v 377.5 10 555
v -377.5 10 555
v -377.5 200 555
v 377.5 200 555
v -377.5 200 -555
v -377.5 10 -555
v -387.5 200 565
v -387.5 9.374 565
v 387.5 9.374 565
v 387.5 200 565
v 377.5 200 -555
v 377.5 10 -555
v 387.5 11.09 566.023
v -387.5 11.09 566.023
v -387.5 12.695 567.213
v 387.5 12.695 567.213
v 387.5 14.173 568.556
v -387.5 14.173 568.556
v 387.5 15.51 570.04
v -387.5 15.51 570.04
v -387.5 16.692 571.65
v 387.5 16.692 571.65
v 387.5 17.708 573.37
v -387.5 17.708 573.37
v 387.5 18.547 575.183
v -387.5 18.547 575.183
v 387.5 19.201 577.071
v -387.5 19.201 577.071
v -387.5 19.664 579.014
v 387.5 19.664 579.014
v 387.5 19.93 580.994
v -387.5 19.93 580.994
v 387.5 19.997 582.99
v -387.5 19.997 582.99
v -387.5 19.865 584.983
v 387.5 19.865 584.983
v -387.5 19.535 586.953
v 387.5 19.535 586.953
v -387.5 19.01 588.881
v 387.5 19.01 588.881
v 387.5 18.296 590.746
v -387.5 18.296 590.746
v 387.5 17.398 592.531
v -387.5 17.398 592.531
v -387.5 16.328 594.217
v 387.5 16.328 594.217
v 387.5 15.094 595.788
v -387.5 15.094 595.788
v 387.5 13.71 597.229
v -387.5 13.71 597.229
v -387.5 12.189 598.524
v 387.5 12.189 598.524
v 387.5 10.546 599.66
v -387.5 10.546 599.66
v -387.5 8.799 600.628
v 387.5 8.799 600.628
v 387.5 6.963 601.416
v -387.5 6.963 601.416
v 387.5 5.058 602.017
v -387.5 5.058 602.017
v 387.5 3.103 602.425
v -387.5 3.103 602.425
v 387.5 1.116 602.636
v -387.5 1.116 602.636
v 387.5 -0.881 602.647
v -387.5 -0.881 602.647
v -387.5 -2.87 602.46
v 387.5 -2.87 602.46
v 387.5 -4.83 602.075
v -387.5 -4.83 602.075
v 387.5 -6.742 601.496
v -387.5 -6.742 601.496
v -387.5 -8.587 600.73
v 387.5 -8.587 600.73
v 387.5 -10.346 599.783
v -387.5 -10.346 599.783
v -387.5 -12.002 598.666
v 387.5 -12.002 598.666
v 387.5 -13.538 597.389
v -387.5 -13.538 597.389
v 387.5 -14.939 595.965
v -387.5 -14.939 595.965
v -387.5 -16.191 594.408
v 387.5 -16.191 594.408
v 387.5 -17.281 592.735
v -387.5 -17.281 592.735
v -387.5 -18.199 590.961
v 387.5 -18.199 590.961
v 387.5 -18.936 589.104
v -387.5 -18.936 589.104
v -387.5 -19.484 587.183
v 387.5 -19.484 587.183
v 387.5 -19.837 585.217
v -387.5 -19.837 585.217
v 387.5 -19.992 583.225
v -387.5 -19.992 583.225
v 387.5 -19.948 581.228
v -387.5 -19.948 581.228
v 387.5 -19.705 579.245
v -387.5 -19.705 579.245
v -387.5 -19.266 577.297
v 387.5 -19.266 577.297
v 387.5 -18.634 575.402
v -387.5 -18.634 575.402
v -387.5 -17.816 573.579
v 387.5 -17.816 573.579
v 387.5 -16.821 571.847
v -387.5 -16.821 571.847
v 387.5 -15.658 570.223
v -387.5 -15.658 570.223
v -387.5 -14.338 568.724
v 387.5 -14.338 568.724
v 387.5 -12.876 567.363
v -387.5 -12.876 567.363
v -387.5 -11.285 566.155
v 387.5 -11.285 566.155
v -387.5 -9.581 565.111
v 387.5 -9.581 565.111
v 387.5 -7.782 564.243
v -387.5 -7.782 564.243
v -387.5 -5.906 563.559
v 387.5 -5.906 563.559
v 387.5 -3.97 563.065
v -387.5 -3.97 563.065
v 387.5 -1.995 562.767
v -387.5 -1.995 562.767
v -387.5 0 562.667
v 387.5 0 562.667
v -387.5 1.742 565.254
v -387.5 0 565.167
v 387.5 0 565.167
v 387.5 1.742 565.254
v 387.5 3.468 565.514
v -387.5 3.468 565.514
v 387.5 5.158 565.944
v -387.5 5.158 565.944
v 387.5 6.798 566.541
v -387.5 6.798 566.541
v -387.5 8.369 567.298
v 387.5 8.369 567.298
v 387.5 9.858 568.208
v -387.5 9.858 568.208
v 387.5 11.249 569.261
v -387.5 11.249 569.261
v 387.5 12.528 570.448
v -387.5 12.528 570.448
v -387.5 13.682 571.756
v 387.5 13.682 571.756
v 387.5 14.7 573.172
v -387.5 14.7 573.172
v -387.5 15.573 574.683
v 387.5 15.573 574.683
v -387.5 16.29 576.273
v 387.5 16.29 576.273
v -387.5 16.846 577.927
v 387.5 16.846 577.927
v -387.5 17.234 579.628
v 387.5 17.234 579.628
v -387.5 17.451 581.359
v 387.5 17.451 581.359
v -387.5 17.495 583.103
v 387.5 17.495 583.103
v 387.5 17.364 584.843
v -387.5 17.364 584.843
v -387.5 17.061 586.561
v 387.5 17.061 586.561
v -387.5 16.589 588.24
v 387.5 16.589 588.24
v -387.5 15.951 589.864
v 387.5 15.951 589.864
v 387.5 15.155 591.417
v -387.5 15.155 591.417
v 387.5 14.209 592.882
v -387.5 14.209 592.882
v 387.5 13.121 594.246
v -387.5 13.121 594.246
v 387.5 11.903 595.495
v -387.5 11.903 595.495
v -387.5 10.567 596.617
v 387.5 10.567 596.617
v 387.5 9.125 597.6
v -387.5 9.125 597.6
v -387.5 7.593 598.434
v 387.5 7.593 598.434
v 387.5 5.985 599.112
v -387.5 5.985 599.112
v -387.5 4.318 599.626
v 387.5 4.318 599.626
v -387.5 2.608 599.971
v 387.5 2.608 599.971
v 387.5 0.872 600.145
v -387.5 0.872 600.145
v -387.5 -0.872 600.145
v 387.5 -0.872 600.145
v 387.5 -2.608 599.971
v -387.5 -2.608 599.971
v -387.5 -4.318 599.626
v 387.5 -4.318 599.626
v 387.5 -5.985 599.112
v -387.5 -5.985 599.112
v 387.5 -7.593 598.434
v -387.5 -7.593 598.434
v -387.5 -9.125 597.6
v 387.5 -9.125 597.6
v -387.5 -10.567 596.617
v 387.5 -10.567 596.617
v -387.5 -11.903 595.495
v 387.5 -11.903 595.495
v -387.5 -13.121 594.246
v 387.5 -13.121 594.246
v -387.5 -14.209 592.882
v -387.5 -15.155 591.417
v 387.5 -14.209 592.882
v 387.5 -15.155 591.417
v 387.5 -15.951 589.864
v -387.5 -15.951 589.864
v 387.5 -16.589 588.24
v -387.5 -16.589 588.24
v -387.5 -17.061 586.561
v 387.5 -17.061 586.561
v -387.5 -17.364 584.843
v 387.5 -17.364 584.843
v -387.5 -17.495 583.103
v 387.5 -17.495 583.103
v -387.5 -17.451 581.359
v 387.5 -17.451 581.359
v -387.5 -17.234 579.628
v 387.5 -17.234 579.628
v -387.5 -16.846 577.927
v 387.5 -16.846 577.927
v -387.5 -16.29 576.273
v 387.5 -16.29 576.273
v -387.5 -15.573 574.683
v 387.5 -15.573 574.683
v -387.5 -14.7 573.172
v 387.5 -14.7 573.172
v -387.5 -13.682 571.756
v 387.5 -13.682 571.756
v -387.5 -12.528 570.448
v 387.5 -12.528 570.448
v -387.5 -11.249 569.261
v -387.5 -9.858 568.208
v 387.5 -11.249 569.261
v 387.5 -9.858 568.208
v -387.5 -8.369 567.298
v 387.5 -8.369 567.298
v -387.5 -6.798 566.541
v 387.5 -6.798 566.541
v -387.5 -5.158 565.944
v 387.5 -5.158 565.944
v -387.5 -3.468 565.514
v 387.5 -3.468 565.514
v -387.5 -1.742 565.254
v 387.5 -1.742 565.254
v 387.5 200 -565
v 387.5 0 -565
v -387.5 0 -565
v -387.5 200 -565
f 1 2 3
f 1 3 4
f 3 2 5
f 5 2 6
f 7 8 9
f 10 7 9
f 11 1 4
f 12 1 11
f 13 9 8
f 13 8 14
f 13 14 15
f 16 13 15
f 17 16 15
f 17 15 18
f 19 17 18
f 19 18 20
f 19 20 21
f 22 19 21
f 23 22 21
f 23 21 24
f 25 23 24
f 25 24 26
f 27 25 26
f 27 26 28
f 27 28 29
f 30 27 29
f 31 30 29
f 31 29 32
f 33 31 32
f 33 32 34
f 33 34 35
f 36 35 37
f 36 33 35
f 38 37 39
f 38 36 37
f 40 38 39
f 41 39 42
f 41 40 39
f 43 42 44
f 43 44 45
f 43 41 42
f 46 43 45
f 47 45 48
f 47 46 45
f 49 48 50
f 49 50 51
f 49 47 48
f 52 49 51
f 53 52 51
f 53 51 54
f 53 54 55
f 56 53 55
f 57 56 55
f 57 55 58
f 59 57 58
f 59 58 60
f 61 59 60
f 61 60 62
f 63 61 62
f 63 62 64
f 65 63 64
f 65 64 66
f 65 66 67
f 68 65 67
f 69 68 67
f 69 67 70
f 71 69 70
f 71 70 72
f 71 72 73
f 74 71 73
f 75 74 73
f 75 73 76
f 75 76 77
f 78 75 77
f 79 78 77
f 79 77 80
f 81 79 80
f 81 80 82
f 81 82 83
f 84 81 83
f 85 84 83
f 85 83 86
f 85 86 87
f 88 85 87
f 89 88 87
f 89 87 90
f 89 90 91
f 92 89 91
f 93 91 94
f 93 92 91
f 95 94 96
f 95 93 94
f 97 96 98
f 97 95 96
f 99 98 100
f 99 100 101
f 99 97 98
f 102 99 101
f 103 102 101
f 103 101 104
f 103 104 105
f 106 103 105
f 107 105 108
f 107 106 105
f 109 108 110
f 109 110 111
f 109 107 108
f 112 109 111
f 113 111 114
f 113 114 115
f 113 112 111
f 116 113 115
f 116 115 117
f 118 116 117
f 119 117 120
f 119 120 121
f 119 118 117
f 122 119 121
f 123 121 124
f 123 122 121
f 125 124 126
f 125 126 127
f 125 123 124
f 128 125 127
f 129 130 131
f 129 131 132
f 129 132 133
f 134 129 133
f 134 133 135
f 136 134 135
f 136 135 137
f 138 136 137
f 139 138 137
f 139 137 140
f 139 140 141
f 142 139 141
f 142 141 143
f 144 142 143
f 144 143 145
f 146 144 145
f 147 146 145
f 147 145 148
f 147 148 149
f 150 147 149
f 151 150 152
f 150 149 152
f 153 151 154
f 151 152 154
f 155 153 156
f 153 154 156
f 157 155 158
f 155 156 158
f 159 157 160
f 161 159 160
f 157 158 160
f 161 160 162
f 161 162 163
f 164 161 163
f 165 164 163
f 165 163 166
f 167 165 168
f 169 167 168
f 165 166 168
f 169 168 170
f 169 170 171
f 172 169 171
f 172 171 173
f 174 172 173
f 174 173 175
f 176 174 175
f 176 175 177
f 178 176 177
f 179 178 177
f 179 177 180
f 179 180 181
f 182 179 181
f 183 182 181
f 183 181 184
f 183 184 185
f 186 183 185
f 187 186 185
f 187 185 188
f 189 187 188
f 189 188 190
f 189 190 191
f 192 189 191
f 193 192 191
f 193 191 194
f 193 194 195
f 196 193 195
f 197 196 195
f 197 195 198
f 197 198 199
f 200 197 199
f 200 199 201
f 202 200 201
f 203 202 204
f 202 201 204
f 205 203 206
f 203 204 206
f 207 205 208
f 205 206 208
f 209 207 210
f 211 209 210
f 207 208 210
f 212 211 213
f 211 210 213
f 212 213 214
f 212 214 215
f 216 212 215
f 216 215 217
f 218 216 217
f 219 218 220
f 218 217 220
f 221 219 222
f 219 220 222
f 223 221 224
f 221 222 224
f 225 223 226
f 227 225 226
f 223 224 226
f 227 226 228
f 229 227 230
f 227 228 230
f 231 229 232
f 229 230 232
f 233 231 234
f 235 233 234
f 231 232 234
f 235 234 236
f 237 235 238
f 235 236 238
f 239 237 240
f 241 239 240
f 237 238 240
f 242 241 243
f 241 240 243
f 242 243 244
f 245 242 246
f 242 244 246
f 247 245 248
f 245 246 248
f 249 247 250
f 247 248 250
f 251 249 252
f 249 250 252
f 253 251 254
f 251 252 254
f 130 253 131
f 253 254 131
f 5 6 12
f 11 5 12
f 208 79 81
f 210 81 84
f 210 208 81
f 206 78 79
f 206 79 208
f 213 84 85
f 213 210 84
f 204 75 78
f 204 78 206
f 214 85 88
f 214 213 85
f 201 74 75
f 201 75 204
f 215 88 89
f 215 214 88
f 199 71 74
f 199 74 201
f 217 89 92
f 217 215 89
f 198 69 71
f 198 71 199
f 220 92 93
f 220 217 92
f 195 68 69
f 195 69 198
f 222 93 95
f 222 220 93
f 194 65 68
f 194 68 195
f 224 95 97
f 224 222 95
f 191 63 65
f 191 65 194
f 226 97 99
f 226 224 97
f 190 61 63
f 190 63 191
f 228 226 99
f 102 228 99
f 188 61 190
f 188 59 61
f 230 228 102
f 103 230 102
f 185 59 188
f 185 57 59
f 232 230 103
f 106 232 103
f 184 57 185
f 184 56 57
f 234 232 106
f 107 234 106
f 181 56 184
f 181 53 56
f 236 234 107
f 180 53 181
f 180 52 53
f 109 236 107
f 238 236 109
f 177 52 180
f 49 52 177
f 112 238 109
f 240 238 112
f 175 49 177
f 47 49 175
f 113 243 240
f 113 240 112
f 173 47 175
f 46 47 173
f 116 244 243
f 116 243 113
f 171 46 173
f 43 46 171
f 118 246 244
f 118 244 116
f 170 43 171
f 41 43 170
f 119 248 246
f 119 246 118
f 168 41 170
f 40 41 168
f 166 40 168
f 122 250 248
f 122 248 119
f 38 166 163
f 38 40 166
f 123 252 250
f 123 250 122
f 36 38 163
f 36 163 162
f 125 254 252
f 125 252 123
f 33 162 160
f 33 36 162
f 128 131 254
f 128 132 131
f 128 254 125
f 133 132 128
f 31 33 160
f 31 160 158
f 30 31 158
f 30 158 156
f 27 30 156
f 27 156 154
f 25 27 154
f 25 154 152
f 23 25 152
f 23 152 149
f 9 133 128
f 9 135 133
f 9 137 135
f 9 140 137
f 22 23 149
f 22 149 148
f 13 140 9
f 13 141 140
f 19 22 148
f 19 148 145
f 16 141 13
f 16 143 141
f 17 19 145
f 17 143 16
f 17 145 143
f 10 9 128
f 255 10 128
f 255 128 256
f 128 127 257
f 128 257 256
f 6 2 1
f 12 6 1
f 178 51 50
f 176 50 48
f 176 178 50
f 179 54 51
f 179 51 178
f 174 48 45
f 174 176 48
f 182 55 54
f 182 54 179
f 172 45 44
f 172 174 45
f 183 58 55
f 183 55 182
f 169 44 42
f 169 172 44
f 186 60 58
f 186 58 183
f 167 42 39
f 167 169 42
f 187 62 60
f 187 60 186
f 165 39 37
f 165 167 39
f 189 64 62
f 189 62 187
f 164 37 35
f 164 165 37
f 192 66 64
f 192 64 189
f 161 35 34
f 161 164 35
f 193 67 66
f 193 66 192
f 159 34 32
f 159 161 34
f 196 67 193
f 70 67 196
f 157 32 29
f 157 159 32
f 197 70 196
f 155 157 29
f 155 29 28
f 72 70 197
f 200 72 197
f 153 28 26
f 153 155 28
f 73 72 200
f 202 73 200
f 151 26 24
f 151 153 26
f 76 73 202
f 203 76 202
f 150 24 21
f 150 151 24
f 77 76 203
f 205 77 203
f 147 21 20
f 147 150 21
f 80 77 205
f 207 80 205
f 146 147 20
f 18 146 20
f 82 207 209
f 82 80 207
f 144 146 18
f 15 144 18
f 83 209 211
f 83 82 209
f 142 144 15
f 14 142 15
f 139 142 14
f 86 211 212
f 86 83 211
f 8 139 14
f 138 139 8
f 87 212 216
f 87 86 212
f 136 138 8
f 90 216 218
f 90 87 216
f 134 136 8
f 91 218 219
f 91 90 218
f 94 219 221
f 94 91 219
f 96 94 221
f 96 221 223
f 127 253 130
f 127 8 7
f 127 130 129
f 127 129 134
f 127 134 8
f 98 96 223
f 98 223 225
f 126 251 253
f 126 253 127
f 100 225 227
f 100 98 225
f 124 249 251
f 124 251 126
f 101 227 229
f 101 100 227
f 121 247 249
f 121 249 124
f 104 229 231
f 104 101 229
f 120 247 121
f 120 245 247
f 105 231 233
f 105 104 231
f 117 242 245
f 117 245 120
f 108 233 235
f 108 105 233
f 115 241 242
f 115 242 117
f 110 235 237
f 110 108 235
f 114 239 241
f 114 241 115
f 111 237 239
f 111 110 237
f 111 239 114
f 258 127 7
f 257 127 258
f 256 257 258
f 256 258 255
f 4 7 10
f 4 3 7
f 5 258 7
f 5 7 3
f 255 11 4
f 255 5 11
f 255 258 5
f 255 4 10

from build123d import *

# Parameters (mm, degrees)
SKETCH1_W           = 775
SKETCH1_H           = 1130
BOSS_EXTRUDE1_DEPTH = 200
SHELL1_T            = -10
SKETCH4_R           = 20
BOSS_EXTRUDE3_DEPTH = 775
SKETCH5_R           = 17.5
CUT_EXTRUDE2_DEPTH  = 1280


with BuildPart() as part:
    # Sketch1 → Boss-Extrude1 (new body)
    with BuildSketch(Plane(origin=(0, 0, 0), x_dir=(1, 0, 0), z_dir=(0, 1, 0))):
        Rectangle(SKETCH1_W, SKETCH1_H)
    extrude(amount=BOSS_EXTRUDE1_DEPTH)

    # Shell1
    shell1_openings = [part.faces().sort_by_distance(p)[0] for p in [
        (0, 200, 0),
    ]]
    offset(amount=SHELL1_T, openings=shell1_openings, kind=Kind.INTERSECTION)

    # Sketch4 → Boss-Extrude3 (add)
    with BuildSketch(Plane(origin=(387.5, 0, 0), x_dir=(0, 0, -1), z_dir=(1, 0, 0))):
        with Locations((-582.66692, 0)):
            Circle(SKETCH4_R)
    extrude(amount=-BOSS_EXTRUDE3_DEPTH)

    # Sketch5 → Cut-Extrude2 (cut)
    with BuildSketch(Plane(origin=(387.5, 0, 0), x_dir=(0, 0, -1), z_dir=(1, 0, 0))):
        with Locations((-582.66692, 0)):
            Circle(SKETCH5_R)
    extrude(amount=-CUT_EXTRUDE2_DEPTH, mode=Mode.SUBTRACT)


solid = part.part
